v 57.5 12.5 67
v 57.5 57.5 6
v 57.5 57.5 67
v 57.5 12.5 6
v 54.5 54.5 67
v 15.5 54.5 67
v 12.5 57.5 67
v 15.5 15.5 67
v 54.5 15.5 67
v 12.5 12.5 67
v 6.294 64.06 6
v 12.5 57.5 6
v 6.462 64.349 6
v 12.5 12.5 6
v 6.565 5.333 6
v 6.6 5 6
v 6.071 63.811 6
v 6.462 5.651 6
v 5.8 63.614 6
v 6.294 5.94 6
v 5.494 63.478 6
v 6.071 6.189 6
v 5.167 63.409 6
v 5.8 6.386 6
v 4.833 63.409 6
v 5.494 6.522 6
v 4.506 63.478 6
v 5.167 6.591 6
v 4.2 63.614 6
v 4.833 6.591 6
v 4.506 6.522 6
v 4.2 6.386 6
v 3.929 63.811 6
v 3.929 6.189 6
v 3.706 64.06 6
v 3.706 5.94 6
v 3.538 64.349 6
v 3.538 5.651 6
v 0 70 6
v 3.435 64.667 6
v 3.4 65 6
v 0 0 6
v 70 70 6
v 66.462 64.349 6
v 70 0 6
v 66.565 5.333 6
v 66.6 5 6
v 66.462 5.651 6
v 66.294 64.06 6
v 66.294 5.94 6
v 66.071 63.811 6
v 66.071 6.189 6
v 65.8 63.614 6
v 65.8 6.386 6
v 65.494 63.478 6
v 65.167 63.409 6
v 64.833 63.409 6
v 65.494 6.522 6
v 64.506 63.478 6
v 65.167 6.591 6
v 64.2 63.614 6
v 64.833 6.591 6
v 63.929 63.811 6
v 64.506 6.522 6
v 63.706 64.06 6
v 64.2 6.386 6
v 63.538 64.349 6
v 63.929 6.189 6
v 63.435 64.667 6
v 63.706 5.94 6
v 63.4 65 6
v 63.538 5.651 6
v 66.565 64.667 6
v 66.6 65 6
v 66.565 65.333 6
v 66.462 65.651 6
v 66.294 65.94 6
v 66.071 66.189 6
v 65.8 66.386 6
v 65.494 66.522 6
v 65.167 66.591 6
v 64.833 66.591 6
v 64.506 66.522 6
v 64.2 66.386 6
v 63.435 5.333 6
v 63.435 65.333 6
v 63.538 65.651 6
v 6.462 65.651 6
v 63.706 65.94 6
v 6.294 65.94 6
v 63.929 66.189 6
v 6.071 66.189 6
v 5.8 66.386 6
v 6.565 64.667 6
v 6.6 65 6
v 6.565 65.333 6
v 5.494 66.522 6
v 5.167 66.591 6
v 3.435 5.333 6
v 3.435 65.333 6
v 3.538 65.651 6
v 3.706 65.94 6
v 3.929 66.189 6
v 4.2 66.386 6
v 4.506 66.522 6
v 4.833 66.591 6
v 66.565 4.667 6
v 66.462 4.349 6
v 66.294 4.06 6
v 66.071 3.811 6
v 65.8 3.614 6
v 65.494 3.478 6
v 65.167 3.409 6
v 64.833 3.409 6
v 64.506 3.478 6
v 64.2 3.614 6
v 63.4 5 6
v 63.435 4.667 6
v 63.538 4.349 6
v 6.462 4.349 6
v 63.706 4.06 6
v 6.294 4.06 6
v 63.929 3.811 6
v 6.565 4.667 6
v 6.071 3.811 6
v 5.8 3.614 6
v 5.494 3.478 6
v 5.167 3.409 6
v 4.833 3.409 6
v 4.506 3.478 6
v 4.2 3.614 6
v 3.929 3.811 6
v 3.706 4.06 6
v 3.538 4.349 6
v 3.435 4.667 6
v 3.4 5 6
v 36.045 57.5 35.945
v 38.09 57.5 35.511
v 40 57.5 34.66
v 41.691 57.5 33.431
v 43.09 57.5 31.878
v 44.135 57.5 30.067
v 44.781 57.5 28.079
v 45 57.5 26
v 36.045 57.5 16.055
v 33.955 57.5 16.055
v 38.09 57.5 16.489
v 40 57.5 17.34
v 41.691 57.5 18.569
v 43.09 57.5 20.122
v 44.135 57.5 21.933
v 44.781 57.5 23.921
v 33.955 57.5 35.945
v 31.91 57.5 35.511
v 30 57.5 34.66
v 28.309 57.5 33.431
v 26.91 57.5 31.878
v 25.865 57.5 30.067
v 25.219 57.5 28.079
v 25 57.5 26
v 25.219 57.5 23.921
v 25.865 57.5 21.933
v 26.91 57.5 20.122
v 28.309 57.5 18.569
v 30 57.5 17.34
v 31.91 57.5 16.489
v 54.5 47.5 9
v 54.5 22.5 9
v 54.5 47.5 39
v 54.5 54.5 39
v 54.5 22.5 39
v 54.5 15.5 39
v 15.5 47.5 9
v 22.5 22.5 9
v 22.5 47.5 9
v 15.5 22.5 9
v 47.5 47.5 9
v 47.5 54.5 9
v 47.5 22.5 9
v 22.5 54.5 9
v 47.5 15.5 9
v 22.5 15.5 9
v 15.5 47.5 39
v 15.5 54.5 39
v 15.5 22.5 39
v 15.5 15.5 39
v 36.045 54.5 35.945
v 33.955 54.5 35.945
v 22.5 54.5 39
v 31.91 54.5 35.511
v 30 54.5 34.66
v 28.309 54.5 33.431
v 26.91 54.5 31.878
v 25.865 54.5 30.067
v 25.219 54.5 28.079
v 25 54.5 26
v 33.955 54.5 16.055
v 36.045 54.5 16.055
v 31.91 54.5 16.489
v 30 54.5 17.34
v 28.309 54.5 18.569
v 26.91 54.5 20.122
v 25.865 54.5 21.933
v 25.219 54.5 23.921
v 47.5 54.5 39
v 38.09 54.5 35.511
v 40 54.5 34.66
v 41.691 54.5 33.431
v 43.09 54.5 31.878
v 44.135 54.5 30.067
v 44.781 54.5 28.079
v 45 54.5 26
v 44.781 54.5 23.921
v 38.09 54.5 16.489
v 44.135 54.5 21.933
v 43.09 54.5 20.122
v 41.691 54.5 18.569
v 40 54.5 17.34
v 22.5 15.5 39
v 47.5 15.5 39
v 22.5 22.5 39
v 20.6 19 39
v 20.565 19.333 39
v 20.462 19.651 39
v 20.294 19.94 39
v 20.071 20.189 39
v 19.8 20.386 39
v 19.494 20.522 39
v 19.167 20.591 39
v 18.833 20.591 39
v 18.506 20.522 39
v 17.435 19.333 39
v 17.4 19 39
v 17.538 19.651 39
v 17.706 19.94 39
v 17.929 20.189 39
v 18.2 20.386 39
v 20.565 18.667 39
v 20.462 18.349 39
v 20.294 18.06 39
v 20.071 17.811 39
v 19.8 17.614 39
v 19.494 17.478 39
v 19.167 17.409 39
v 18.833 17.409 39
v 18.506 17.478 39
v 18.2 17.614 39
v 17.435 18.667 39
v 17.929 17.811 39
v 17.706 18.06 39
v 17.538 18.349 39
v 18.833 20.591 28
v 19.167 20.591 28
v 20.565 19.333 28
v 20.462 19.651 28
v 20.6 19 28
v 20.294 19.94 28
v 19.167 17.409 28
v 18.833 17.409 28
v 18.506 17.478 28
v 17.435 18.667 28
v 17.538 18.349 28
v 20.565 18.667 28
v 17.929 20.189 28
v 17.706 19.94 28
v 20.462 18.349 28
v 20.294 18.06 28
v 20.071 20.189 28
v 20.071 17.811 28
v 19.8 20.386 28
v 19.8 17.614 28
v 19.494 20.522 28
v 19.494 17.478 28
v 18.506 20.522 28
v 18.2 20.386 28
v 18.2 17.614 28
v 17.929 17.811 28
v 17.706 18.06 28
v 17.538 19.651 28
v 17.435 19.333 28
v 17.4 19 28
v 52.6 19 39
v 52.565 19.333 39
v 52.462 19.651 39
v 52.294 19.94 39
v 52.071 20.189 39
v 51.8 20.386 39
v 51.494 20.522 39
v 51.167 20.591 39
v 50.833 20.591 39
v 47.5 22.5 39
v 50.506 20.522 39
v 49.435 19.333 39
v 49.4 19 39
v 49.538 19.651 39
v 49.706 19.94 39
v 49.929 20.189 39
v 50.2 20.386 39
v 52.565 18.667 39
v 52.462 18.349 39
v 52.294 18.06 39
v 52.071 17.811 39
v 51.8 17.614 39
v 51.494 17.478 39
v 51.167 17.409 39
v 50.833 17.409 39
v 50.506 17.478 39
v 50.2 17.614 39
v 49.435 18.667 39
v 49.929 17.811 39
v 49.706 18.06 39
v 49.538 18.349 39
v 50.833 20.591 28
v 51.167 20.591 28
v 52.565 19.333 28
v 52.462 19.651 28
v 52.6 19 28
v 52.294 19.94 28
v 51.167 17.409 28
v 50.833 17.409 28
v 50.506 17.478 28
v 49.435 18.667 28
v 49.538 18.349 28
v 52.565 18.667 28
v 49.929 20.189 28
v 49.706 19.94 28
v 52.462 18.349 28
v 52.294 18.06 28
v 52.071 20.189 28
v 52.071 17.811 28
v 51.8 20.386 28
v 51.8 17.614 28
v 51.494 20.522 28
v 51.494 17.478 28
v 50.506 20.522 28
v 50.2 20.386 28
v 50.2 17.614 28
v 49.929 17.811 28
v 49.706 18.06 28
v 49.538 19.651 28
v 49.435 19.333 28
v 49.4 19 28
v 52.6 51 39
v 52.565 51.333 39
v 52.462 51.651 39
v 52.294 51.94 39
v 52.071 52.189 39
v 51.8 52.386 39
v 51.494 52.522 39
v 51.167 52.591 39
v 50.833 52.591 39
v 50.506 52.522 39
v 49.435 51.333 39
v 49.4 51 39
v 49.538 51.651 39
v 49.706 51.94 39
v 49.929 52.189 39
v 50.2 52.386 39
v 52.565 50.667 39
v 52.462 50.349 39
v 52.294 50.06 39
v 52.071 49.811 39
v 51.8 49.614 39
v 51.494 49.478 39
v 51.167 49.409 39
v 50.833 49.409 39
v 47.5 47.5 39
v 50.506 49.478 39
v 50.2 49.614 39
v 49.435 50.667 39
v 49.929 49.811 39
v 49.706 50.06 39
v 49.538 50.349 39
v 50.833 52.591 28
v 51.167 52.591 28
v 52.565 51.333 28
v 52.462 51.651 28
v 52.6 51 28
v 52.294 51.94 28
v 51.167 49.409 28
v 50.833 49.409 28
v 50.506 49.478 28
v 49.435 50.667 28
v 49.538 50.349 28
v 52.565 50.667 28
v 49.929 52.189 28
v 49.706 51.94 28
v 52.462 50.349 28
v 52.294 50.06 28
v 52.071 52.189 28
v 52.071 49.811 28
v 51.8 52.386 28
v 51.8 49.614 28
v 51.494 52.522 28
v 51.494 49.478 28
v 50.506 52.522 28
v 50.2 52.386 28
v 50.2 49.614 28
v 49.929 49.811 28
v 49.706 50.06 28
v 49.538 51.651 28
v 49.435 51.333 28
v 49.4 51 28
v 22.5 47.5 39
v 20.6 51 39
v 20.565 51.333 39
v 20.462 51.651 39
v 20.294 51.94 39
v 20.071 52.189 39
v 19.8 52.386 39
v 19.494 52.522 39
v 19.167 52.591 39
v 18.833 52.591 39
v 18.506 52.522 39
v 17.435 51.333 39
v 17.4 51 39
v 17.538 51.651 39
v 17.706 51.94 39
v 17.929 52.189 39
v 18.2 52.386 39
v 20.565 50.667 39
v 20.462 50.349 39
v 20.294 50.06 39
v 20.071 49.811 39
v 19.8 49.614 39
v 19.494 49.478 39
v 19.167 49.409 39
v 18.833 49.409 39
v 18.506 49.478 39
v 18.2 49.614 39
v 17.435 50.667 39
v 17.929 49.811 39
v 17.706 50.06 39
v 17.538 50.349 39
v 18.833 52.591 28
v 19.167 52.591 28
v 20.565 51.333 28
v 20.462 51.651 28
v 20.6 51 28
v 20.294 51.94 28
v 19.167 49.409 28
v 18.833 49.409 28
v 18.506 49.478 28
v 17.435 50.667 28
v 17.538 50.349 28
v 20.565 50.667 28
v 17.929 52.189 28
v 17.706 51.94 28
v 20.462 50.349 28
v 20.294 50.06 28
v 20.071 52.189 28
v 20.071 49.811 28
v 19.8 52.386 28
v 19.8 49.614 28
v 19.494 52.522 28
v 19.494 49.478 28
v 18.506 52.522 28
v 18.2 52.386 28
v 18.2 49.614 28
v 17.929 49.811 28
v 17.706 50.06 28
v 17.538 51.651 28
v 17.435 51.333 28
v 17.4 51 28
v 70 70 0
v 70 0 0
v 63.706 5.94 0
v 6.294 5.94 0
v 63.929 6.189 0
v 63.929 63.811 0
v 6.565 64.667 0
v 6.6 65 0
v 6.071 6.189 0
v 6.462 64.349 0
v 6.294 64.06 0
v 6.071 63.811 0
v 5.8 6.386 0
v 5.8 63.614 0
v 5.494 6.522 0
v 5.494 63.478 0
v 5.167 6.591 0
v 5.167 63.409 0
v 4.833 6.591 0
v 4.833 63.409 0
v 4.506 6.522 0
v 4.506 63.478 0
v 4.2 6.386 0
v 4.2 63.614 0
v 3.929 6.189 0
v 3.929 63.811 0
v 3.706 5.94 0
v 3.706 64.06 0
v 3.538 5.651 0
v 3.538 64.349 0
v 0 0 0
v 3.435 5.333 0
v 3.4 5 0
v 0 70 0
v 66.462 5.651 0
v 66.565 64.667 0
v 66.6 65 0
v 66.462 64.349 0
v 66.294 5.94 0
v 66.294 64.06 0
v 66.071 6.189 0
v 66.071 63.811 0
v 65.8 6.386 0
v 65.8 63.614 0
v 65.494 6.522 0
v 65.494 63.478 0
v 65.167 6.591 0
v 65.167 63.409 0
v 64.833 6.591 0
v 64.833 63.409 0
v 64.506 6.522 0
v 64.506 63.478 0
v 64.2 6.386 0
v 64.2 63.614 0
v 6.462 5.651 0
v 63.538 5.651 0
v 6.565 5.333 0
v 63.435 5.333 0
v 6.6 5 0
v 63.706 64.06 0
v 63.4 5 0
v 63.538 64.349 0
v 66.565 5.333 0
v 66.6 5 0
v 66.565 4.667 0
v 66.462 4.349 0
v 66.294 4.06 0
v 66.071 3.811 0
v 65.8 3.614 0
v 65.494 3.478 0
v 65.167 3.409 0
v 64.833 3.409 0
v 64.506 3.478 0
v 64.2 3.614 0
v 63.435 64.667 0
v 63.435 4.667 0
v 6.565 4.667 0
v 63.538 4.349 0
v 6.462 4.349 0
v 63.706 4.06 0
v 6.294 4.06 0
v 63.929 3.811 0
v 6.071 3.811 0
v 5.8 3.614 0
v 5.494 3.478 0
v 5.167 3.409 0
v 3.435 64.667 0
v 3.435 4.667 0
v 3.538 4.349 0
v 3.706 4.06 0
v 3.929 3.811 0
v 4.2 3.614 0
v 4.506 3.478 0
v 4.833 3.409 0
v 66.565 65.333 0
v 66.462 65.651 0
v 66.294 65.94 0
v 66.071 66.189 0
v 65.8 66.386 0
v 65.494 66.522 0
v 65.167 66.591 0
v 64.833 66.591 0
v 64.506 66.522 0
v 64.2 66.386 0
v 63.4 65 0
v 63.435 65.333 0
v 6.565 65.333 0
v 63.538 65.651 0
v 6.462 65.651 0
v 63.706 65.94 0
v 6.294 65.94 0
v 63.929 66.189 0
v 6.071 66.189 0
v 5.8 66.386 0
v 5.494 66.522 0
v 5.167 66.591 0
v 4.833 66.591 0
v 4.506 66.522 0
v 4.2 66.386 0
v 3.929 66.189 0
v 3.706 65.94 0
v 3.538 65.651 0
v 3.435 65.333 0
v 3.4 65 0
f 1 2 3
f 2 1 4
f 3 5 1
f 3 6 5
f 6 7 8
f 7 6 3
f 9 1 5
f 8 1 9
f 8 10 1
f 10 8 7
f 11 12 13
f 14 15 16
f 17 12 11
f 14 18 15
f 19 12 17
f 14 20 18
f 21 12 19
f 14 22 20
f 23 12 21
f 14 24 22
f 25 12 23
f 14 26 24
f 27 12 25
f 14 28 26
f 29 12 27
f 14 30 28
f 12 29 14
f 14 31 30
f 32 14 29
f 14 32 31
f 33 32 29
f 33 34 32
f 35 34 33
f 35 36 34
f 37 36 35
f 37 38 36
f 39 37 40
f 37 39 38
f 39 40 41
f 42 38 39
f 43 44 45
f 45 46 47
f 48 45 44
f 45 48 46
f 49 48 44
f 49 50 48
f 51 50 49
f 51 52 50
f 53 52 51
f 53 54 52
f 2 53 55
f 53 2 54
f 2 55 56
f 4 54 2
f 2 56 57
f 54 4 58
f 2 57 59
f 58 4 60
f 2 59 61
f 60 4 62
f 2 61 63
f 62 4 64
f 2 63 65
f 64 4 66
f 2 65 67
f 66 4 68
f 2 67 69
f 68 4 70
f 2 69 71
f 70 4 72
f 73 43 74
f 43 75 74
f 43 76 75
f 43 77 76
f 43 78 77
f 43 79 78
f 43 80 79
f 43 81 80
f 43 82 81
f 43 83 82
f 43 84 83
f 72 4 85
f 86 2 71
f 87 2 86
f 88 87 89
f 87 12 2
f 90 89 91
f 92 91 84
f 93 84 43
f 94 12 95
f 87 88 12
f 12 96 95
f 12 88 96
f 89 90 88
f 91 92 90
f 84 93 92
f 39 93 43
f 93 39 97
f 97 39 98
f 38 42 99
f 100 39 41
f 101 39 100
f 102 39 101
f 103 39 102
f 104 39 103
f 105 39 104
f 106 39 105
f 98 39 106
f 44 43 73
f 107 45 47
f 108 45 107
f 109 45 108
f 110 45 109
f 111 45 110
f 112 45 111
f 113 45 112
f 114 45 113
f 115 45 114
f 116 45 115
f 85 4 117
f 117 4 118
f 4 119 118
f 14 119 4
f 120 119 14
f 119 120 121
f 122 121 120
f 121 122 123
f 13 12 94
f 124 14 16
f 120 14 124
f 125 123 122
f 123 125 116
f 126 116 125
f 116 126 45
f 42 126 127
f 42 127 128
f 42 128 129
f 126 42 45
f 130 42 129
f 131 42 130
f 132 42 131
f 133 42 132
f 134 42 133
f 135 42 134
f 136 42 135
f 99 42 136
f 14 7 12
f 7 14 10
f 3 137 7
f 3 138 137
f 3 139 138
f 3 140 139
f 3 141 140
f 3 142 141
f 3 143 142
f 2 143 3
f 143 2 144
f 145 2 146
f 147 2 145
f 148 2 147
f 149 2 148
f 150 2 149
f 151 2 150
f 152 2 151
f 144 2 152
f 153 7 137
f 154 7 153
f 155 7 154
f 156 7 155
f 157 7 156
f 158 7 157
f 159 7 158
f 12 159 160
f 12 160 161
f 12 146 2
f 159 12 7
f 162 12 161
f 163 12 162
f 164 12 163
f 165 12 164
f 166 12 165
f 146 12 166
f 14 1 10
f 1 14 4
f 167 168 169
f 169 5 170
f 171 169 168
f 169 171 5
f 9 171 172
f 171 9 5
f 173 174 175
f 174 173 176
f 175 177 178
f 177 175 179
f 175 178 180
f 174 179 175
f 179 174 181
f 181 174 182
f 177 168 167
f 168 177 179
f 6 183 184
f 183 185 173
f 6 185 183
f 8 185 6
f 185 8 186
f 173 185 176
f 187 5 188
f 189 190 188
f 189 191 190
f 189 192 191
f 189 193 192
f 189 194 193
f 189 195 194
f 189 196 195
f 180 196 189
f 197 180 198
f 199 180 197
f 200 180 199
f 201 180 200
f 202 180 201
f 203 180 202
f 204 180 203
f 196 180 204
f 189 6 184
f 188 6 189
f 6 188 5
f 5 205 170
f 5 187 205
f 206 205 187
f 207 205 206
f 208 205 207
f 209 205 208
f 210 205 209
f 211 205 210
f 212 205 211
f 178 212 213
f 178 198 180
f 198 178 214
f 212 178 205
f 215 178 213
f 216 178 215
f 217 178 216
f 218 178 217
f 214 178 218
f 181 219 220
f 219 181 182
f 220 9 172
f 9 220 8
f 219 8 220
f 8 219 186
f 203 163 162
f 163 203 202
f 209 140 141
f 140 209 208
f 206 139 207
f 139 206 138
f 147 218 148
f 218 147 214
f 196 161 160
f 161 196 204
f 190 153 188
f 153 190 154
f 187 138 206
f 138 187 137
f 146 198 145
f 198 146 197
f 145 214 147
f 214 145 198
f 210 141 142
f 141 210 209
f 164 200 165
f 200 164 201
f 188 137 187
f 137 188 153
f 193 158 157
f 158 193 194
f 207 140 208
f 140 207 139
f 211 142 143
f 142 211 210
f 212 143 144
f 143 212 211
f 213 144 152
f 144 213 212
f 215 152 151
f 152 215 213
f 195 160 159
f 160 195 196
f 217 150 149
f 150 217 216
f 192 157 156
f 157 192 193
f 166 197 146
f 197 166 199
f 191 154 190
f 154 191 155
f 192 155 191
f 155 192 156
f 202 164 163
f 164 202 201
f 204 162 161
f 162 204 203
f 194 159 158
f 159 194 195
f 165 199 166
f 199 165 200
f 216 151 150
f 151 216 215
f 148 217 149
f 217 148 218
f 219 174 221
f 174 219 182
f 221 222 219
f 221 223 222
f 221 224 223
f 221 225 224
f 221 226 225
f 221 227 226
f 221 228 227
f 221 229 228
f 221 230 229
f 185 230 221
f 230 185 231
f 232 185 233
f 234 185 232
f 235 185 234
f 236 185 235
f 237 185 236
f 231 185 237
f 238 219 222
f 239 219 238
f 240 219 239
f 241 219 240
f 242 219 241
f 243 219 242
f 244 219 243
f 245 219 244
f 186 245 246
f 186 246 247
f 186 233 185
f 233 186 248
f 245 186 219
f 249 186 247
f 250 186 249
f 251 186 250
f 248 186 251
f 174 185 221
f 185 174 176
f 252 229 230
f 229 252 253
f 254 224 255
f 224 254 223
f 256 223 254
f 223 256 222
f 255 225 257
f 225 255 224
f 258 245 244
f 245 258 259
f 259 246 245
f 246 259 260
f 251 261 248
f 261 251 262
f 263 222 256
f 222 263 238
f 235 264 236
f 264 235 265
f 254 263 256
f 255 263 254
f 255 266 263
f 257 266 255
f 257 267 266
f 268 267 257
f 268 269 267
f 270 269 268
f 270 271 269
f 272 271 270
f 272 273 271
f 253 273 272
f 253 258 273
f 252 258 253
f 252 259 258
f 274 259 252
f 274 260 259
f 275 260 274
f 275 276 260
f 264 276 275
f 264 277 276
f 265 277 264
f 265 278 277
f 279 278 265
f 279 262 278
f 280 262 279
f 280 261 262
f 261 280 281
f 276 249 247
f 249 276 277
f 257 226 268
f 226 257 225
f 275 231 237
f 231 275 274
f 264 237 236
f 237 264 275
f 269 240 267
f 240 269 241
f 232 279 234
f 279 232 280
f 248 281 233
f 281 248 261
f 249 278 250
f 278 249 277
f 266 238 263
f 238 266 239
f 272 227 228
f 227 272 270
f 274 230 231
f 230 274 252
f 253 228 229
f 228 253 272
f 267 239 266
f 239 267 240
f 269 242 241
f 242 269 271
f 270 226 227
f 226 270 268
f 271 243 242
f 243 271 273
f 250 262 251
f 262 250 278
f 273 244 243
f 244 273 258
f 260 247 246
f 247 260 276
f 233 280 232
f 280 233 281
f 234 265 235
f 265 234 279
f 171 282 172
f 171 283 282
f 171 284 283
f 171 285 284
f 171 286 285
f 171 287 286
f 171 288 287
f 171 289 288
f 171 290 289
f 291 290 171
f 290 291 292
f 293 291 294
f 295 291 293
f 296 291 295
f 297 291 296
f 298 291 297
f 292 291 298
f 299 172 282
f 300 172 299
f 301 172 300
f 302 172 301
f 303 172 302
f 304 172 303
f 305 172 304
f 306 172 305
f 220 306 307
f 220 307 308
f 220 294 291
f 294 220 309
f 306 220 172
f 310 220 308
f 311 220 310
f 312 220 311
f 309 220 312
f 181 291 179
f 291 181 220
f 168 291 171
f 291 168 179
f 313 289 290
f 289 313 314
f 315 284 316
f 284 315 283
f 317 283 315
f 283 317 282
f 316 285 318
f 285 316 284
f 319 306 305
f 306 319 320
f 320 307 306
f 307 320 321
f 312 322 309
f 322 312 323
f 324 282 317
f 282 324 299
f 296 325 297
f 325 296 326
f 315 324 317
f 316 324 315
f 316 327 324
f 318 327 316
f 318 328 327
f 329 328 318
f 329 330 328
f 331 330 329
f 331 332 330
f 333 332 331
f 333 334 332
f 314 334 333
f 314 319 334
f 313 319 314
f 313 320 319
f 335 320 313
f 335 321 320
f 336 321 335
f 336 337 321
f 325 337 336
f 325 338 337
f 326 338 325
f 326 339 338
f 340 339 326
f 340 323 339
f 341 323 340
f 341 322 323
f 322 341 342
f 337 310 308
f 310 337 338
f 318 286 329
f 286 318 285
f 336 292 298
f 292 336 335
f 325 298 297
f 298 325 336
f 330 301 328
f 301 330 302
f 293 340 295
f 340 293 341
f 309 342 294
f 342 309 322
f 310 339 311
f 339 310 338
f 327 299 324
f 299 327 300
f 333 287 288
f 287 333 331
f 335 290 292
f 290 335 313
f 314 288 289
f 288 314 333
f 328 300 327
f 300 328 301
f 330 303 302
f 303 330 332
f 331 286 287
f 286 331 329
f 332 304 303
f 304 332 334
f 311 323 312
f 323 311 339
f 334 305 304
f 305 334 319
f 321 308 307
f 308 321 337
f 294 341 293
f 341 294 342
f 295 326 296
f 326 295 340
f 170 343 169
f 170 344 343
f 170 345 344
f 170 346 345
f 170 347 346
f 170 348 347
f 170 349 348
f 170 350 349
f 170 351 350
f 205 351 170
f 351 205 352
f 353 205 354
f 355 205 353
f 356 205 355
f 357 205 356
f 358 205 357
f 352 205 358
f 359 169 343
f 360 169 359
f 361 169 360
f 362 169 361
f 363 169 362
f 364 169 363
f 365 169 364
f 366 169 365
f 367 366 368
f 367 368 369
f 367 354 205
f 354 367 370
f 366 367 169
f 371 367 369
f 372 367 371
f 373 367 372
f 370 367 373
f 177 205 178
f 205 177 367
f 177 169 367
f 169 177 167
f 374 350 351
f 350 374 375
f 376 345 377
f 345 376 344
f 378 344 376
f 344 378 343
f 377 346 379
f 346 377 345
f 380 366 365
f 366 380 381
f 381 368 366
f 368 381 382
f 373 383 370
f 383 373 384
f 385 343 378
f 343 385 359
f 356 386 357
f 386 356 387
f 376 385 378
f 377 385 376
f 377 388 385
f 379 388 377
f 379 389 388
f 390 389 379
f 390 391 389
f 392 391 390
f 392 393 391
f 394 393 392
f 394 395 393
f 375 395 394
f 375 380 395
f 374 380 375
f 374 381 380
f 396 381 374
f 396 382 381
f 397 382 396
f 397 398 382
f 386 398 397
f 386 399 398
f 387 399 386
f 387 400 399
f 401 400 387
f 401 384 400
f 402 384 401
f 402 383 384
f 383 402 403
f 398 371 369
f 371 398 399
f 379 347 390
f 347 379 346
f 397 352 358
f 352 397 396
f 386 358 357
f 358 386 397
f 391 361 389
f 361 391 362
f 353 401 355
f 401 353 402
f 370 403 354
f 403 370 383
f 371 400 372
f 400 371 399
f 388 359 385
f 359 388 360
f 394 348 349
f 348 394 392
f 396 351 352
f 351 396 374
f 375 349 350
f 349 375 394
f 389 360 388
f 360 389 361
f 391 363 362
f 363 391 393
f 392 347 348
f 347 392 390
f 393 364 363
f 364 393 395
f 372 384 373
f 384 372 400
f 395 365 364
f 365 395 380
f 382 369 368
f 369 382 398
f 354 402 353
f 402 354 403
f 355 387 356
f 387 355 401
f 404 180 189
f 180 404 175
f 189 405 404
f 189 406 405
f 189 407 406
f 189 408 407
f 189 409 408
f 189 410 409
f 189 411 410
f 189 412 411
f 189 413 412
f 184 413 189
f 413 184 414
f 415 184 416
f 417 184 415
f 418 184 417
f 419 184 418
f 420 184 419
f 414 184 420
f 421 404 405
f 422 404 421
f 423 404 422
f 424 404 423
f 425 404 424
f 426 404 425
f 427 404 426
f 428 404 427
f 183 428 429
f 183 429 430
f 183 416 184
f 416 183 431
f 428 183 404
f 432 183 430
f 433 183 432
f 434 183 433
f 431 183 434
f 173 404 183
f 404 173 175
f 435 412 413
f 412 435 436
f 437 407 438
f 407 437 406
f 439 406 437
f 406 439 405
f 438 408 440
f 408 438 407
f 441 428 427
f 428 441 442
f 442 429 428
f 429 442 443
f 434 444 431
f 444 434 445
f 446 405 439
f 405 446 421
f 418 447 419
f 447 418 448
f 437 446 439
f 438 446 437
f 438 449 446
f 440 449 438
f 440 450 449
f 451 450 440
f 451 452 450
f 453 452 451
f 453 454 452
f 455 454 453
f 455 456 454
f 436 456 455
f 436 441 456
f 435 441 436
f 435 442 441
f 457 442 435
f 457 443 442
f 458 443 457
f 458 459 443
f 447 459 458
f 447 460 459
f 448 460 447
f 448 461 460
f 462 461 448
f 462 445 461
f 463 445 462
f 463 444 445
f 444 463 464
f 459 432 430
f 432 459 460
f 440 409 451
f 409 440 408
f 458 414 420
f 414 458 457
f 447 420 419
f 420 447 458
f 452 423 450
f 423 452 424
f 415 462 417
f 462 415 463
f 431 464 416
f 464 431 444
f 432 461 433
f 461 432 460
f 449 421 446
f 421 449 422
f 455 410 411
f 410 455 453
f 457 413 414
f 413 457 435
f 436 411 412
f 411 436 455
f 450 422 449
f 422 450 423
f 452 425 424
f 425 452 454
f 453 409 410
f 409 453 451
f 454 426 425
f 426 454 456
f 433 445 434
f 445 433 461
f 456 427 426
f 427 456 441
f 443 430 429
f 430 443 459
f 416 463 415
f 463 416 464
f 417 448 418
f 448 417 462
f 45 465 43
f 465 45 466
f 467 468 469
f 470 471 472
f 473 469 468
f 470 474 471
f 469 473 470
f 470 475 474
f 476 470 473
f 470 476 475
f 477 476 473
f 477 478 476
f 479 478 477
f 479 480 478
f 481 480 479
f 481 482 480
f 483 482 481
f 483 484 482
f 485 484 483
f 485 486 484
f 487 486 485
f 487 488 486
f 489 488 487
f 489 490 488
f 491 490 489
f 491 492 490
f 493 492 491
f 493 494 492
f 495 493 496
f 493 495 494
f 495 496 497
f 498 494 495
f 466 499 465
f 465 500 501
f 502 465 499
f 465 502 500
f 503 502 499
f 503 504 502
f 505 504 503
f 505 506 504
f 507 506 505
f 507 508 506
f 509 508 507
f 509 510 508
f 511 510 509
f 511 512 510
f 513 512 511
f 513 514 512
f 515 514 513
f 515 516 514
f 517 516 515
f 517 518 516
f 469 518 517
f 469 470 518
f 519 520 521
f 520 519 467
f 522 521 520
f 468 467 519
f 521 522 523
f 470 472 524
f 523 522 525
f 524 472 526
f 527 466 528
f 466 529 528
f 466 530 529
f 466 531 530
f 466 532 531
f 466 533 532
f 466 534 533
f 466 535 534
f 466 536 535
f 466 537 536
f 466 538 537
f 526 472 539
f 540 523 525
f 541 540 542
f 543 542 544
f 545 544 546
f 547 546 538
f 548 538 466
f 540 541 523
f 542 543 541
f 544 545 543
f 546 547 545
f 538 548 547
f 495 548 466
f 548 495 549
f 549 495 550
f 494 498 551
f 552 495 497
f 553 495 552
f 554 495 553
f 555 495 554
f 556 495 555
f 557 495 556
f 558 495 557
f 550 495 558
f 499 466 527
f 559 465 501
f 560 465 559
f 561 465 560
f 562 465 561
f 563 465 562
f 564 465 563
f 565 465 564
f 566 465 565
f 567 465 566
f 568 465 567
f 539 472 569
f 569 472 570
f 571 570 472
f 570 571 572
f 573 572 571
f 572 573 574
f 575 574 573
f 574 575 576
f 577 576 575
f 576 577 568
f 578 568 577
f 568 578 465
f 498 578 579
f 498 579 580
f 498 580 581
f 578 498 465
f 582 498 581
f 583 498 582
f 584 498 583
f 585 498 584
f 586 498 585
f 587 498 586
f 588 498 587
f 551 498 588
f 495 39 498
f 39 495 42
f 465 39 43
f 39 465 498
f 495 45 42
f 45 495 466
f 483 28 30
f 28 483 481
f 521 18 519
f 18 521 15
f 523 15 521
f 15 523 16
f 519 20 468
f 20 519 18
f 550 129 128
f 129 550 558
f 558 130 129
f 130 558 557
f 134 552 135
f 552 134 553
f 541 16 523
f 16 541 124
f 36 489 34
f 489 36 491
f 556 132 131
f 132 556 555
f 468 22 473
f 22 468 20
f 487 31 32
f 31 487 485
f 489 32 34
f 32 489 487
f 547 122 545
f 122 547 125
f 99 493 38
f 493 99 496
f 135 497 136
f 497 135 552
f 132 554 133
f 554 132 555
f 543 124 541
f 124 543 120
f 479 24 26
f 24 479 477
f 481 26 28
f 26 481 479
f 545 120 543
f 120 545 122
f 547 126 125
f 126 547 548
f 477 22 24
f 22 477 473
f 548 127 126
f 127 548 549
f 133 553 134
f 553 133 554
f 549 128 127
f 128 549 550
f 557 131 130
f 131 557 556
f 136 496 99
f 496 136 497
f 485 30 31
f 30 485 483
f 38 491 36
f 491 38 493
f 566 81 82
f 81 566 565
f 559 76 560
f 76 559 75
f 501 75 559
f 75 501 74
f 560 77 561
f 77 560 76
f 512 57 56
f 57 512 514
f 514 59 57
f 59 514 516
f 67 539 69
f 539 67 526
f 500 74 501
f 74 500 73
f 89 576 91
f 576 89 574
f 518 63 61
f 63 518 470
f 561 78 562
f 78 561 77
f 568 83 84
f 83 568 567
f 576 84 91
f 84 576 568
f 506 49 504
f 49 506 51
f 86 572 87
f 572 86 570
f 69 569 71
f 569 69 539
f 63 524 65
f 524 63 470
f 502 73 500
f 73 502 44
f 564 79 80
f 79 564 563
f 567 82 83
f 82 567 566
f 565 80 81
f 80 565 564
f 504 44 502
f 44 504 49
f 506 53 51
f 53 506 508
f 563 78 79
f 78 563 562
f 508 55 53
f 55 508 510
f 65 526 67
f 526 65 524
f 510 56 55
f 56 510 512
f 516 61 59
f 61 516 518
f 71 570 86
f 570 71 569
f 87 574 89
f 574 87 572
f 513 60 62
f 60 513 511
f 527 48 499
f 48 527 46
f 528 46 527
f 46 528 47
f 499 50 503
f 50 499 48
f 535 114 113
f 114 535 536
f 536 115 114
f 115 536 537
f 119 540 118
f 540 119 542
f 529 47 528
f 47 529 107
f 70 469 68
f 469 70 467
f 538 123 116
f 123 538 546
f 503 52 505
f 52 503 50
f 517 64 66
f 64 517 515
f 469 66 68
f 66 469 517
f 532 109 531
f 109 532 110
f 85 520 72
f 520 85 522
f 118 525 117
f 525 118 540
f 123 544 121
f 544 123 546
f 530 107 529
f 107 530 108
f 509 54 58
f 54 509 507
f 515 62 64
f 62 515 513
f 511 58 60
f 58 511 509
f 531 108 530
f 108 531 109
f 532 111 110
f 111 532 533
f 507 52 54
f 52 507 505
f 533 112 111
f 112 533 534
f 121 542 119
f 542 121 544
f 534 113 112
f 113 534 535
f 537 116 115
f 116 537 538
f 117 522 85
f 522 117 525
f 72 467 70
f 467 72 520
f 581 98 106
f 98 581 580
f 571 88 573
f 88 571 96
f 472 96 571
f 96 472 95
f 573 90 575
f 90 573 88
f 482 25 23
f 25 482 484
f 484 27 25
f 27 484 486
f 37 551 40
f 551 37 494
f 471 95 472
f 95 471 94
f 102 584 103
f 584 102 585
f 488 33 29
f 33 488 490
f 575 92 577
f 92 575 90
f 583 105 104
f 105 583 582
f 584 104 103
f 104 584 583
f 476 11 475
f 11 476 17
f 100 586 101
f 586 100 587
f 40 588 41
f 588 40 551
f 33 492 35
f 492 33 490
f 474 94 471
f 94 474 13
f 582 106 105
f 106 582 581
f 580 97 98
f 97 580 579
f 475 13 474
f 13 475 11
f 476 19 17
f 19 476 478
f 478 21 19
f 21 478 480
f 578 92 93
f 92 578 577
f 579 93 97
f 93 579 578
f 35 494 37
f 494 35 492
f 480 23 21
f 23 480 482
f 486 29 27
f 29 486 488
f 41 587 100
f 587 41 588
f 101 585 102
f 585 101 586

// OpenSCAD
//cable hole diameter
cb_diameter = 20;

//base of camera board to top of lens
cam_h = 25;

//height camera should be suspended above the bottom of the box
cam_suspend_h = 30;

//side length of square indents the camera board will rest on
rest_indent_l = 7;

//whole camera board length. It is square
cam_board_l = 39;

//wall thickness of box x2
wall_thick = 6;

//length of box
box_l = cam_board_l+wall_thick;


//base square length
base_l = 70;

//added distance to get to middle of base square
base_add = (base_l-(cam_board_l+wall_thick))/2;

//subract cylinder from box with subracted box
translate([base_add, base_add, wall_thick])
{
difference()
{
// make cube which will be subtracted from bigger cube
difference()
{
{cube([cam_board_l+wall_thick, cam_board_l+wall_thick, cam_suspend_h+cam_h+wall_thick]);

translate([wall_thick/2, wall_thick/2, wall_thick/2])
{cube([cam_board_l, cam_board_l, cam_suspend_h+cam_h+5]);}

}}
// check how to rotate a cylinder

//make cylinder
//rotate by degrees around a defined axis

//define where to put hole
translate([box_l/2,box_l+1,20])
{rotate([90,0,0])
{cylinder(h=wall_thick/2+2, r1 = cb_diameter/2, r2 = cb_diameter/2);
}}}}


//change circularity of cylinder
$fn = 30;

//add indents for camera to rest on

// define thickness of the indent
indent_h = cam_suspend_h;

//module for supporting pillars
module pillar(){
    cube([rest_indent_l, rest_indent_l, indent_h]);
}

//module for m3 screw holes with a 0.1mm tolerance
module m3_hole(){
    diameter=3;
    tol = 0.1;
    cylinder(h=wall_thick*2, d1 = 
    diameter+tol*2, d2 = diameter+tol*2);
}

translate([base_add, base_add, wall_thick])
{
//make indent cube and move it to the corners of the box
translate([wall_thick/2,wall_thick/2,wall_thick/2])   
{difference(){
pillar();
 translate([rest_indent_l/2, rest_indent_l/2, cam_suspend_h-wall_thick*2+1]){    
 m3_hole();}}
}

//indent 2
translate([cam_board_l-wall_thick/1.5,wall_thick/2,wall_thick/2])
{difference(){
pillar();
 translate([rest_indent_l/2, rest_indent_l/2, cam_suspend_h-wall_thick*2+1]){    
 m3_hole();}}
}

//indent 3
translate([cam_board_l-wall_thick/1.5,cam_board_l-wall_thick/1.5,wall_thick/2])
{difference(){
pillar();
 translate([rest_indent_l/2, rest_indent_l/2, cam_suspend_h-wall_thick*2+1]){    
 m3_hole();}}
}

//indent 4
translate([wall_thick/2,cam_board_l-wall_thick/1.5,wall_thick/2])
{difference(){
pillar();
 translate([rest_indent_l/2, rest_indent_l/2, cam_suspend_h-wall_thick*2+1]){    
 m3_hole();}}
}
}

//how far in m3 holes should be
m3_loc = 5;

//make base plate and drill holes
difference()
{
cube([base_l, base_l, wall_thick]);
    
 translate([m3_loc, m3_loc, -1]){
 m3_hole();}

 translate([base_l-m3_loc, base_l-m3_loc,-1]){
 m3_hole();}

 translate([base_l-m3_loc, m3_loc,-1]){
 m3_hole();}

 translate([m3_loc, base_l-m3_loc, -1]){
 m3_hole();}
} 
